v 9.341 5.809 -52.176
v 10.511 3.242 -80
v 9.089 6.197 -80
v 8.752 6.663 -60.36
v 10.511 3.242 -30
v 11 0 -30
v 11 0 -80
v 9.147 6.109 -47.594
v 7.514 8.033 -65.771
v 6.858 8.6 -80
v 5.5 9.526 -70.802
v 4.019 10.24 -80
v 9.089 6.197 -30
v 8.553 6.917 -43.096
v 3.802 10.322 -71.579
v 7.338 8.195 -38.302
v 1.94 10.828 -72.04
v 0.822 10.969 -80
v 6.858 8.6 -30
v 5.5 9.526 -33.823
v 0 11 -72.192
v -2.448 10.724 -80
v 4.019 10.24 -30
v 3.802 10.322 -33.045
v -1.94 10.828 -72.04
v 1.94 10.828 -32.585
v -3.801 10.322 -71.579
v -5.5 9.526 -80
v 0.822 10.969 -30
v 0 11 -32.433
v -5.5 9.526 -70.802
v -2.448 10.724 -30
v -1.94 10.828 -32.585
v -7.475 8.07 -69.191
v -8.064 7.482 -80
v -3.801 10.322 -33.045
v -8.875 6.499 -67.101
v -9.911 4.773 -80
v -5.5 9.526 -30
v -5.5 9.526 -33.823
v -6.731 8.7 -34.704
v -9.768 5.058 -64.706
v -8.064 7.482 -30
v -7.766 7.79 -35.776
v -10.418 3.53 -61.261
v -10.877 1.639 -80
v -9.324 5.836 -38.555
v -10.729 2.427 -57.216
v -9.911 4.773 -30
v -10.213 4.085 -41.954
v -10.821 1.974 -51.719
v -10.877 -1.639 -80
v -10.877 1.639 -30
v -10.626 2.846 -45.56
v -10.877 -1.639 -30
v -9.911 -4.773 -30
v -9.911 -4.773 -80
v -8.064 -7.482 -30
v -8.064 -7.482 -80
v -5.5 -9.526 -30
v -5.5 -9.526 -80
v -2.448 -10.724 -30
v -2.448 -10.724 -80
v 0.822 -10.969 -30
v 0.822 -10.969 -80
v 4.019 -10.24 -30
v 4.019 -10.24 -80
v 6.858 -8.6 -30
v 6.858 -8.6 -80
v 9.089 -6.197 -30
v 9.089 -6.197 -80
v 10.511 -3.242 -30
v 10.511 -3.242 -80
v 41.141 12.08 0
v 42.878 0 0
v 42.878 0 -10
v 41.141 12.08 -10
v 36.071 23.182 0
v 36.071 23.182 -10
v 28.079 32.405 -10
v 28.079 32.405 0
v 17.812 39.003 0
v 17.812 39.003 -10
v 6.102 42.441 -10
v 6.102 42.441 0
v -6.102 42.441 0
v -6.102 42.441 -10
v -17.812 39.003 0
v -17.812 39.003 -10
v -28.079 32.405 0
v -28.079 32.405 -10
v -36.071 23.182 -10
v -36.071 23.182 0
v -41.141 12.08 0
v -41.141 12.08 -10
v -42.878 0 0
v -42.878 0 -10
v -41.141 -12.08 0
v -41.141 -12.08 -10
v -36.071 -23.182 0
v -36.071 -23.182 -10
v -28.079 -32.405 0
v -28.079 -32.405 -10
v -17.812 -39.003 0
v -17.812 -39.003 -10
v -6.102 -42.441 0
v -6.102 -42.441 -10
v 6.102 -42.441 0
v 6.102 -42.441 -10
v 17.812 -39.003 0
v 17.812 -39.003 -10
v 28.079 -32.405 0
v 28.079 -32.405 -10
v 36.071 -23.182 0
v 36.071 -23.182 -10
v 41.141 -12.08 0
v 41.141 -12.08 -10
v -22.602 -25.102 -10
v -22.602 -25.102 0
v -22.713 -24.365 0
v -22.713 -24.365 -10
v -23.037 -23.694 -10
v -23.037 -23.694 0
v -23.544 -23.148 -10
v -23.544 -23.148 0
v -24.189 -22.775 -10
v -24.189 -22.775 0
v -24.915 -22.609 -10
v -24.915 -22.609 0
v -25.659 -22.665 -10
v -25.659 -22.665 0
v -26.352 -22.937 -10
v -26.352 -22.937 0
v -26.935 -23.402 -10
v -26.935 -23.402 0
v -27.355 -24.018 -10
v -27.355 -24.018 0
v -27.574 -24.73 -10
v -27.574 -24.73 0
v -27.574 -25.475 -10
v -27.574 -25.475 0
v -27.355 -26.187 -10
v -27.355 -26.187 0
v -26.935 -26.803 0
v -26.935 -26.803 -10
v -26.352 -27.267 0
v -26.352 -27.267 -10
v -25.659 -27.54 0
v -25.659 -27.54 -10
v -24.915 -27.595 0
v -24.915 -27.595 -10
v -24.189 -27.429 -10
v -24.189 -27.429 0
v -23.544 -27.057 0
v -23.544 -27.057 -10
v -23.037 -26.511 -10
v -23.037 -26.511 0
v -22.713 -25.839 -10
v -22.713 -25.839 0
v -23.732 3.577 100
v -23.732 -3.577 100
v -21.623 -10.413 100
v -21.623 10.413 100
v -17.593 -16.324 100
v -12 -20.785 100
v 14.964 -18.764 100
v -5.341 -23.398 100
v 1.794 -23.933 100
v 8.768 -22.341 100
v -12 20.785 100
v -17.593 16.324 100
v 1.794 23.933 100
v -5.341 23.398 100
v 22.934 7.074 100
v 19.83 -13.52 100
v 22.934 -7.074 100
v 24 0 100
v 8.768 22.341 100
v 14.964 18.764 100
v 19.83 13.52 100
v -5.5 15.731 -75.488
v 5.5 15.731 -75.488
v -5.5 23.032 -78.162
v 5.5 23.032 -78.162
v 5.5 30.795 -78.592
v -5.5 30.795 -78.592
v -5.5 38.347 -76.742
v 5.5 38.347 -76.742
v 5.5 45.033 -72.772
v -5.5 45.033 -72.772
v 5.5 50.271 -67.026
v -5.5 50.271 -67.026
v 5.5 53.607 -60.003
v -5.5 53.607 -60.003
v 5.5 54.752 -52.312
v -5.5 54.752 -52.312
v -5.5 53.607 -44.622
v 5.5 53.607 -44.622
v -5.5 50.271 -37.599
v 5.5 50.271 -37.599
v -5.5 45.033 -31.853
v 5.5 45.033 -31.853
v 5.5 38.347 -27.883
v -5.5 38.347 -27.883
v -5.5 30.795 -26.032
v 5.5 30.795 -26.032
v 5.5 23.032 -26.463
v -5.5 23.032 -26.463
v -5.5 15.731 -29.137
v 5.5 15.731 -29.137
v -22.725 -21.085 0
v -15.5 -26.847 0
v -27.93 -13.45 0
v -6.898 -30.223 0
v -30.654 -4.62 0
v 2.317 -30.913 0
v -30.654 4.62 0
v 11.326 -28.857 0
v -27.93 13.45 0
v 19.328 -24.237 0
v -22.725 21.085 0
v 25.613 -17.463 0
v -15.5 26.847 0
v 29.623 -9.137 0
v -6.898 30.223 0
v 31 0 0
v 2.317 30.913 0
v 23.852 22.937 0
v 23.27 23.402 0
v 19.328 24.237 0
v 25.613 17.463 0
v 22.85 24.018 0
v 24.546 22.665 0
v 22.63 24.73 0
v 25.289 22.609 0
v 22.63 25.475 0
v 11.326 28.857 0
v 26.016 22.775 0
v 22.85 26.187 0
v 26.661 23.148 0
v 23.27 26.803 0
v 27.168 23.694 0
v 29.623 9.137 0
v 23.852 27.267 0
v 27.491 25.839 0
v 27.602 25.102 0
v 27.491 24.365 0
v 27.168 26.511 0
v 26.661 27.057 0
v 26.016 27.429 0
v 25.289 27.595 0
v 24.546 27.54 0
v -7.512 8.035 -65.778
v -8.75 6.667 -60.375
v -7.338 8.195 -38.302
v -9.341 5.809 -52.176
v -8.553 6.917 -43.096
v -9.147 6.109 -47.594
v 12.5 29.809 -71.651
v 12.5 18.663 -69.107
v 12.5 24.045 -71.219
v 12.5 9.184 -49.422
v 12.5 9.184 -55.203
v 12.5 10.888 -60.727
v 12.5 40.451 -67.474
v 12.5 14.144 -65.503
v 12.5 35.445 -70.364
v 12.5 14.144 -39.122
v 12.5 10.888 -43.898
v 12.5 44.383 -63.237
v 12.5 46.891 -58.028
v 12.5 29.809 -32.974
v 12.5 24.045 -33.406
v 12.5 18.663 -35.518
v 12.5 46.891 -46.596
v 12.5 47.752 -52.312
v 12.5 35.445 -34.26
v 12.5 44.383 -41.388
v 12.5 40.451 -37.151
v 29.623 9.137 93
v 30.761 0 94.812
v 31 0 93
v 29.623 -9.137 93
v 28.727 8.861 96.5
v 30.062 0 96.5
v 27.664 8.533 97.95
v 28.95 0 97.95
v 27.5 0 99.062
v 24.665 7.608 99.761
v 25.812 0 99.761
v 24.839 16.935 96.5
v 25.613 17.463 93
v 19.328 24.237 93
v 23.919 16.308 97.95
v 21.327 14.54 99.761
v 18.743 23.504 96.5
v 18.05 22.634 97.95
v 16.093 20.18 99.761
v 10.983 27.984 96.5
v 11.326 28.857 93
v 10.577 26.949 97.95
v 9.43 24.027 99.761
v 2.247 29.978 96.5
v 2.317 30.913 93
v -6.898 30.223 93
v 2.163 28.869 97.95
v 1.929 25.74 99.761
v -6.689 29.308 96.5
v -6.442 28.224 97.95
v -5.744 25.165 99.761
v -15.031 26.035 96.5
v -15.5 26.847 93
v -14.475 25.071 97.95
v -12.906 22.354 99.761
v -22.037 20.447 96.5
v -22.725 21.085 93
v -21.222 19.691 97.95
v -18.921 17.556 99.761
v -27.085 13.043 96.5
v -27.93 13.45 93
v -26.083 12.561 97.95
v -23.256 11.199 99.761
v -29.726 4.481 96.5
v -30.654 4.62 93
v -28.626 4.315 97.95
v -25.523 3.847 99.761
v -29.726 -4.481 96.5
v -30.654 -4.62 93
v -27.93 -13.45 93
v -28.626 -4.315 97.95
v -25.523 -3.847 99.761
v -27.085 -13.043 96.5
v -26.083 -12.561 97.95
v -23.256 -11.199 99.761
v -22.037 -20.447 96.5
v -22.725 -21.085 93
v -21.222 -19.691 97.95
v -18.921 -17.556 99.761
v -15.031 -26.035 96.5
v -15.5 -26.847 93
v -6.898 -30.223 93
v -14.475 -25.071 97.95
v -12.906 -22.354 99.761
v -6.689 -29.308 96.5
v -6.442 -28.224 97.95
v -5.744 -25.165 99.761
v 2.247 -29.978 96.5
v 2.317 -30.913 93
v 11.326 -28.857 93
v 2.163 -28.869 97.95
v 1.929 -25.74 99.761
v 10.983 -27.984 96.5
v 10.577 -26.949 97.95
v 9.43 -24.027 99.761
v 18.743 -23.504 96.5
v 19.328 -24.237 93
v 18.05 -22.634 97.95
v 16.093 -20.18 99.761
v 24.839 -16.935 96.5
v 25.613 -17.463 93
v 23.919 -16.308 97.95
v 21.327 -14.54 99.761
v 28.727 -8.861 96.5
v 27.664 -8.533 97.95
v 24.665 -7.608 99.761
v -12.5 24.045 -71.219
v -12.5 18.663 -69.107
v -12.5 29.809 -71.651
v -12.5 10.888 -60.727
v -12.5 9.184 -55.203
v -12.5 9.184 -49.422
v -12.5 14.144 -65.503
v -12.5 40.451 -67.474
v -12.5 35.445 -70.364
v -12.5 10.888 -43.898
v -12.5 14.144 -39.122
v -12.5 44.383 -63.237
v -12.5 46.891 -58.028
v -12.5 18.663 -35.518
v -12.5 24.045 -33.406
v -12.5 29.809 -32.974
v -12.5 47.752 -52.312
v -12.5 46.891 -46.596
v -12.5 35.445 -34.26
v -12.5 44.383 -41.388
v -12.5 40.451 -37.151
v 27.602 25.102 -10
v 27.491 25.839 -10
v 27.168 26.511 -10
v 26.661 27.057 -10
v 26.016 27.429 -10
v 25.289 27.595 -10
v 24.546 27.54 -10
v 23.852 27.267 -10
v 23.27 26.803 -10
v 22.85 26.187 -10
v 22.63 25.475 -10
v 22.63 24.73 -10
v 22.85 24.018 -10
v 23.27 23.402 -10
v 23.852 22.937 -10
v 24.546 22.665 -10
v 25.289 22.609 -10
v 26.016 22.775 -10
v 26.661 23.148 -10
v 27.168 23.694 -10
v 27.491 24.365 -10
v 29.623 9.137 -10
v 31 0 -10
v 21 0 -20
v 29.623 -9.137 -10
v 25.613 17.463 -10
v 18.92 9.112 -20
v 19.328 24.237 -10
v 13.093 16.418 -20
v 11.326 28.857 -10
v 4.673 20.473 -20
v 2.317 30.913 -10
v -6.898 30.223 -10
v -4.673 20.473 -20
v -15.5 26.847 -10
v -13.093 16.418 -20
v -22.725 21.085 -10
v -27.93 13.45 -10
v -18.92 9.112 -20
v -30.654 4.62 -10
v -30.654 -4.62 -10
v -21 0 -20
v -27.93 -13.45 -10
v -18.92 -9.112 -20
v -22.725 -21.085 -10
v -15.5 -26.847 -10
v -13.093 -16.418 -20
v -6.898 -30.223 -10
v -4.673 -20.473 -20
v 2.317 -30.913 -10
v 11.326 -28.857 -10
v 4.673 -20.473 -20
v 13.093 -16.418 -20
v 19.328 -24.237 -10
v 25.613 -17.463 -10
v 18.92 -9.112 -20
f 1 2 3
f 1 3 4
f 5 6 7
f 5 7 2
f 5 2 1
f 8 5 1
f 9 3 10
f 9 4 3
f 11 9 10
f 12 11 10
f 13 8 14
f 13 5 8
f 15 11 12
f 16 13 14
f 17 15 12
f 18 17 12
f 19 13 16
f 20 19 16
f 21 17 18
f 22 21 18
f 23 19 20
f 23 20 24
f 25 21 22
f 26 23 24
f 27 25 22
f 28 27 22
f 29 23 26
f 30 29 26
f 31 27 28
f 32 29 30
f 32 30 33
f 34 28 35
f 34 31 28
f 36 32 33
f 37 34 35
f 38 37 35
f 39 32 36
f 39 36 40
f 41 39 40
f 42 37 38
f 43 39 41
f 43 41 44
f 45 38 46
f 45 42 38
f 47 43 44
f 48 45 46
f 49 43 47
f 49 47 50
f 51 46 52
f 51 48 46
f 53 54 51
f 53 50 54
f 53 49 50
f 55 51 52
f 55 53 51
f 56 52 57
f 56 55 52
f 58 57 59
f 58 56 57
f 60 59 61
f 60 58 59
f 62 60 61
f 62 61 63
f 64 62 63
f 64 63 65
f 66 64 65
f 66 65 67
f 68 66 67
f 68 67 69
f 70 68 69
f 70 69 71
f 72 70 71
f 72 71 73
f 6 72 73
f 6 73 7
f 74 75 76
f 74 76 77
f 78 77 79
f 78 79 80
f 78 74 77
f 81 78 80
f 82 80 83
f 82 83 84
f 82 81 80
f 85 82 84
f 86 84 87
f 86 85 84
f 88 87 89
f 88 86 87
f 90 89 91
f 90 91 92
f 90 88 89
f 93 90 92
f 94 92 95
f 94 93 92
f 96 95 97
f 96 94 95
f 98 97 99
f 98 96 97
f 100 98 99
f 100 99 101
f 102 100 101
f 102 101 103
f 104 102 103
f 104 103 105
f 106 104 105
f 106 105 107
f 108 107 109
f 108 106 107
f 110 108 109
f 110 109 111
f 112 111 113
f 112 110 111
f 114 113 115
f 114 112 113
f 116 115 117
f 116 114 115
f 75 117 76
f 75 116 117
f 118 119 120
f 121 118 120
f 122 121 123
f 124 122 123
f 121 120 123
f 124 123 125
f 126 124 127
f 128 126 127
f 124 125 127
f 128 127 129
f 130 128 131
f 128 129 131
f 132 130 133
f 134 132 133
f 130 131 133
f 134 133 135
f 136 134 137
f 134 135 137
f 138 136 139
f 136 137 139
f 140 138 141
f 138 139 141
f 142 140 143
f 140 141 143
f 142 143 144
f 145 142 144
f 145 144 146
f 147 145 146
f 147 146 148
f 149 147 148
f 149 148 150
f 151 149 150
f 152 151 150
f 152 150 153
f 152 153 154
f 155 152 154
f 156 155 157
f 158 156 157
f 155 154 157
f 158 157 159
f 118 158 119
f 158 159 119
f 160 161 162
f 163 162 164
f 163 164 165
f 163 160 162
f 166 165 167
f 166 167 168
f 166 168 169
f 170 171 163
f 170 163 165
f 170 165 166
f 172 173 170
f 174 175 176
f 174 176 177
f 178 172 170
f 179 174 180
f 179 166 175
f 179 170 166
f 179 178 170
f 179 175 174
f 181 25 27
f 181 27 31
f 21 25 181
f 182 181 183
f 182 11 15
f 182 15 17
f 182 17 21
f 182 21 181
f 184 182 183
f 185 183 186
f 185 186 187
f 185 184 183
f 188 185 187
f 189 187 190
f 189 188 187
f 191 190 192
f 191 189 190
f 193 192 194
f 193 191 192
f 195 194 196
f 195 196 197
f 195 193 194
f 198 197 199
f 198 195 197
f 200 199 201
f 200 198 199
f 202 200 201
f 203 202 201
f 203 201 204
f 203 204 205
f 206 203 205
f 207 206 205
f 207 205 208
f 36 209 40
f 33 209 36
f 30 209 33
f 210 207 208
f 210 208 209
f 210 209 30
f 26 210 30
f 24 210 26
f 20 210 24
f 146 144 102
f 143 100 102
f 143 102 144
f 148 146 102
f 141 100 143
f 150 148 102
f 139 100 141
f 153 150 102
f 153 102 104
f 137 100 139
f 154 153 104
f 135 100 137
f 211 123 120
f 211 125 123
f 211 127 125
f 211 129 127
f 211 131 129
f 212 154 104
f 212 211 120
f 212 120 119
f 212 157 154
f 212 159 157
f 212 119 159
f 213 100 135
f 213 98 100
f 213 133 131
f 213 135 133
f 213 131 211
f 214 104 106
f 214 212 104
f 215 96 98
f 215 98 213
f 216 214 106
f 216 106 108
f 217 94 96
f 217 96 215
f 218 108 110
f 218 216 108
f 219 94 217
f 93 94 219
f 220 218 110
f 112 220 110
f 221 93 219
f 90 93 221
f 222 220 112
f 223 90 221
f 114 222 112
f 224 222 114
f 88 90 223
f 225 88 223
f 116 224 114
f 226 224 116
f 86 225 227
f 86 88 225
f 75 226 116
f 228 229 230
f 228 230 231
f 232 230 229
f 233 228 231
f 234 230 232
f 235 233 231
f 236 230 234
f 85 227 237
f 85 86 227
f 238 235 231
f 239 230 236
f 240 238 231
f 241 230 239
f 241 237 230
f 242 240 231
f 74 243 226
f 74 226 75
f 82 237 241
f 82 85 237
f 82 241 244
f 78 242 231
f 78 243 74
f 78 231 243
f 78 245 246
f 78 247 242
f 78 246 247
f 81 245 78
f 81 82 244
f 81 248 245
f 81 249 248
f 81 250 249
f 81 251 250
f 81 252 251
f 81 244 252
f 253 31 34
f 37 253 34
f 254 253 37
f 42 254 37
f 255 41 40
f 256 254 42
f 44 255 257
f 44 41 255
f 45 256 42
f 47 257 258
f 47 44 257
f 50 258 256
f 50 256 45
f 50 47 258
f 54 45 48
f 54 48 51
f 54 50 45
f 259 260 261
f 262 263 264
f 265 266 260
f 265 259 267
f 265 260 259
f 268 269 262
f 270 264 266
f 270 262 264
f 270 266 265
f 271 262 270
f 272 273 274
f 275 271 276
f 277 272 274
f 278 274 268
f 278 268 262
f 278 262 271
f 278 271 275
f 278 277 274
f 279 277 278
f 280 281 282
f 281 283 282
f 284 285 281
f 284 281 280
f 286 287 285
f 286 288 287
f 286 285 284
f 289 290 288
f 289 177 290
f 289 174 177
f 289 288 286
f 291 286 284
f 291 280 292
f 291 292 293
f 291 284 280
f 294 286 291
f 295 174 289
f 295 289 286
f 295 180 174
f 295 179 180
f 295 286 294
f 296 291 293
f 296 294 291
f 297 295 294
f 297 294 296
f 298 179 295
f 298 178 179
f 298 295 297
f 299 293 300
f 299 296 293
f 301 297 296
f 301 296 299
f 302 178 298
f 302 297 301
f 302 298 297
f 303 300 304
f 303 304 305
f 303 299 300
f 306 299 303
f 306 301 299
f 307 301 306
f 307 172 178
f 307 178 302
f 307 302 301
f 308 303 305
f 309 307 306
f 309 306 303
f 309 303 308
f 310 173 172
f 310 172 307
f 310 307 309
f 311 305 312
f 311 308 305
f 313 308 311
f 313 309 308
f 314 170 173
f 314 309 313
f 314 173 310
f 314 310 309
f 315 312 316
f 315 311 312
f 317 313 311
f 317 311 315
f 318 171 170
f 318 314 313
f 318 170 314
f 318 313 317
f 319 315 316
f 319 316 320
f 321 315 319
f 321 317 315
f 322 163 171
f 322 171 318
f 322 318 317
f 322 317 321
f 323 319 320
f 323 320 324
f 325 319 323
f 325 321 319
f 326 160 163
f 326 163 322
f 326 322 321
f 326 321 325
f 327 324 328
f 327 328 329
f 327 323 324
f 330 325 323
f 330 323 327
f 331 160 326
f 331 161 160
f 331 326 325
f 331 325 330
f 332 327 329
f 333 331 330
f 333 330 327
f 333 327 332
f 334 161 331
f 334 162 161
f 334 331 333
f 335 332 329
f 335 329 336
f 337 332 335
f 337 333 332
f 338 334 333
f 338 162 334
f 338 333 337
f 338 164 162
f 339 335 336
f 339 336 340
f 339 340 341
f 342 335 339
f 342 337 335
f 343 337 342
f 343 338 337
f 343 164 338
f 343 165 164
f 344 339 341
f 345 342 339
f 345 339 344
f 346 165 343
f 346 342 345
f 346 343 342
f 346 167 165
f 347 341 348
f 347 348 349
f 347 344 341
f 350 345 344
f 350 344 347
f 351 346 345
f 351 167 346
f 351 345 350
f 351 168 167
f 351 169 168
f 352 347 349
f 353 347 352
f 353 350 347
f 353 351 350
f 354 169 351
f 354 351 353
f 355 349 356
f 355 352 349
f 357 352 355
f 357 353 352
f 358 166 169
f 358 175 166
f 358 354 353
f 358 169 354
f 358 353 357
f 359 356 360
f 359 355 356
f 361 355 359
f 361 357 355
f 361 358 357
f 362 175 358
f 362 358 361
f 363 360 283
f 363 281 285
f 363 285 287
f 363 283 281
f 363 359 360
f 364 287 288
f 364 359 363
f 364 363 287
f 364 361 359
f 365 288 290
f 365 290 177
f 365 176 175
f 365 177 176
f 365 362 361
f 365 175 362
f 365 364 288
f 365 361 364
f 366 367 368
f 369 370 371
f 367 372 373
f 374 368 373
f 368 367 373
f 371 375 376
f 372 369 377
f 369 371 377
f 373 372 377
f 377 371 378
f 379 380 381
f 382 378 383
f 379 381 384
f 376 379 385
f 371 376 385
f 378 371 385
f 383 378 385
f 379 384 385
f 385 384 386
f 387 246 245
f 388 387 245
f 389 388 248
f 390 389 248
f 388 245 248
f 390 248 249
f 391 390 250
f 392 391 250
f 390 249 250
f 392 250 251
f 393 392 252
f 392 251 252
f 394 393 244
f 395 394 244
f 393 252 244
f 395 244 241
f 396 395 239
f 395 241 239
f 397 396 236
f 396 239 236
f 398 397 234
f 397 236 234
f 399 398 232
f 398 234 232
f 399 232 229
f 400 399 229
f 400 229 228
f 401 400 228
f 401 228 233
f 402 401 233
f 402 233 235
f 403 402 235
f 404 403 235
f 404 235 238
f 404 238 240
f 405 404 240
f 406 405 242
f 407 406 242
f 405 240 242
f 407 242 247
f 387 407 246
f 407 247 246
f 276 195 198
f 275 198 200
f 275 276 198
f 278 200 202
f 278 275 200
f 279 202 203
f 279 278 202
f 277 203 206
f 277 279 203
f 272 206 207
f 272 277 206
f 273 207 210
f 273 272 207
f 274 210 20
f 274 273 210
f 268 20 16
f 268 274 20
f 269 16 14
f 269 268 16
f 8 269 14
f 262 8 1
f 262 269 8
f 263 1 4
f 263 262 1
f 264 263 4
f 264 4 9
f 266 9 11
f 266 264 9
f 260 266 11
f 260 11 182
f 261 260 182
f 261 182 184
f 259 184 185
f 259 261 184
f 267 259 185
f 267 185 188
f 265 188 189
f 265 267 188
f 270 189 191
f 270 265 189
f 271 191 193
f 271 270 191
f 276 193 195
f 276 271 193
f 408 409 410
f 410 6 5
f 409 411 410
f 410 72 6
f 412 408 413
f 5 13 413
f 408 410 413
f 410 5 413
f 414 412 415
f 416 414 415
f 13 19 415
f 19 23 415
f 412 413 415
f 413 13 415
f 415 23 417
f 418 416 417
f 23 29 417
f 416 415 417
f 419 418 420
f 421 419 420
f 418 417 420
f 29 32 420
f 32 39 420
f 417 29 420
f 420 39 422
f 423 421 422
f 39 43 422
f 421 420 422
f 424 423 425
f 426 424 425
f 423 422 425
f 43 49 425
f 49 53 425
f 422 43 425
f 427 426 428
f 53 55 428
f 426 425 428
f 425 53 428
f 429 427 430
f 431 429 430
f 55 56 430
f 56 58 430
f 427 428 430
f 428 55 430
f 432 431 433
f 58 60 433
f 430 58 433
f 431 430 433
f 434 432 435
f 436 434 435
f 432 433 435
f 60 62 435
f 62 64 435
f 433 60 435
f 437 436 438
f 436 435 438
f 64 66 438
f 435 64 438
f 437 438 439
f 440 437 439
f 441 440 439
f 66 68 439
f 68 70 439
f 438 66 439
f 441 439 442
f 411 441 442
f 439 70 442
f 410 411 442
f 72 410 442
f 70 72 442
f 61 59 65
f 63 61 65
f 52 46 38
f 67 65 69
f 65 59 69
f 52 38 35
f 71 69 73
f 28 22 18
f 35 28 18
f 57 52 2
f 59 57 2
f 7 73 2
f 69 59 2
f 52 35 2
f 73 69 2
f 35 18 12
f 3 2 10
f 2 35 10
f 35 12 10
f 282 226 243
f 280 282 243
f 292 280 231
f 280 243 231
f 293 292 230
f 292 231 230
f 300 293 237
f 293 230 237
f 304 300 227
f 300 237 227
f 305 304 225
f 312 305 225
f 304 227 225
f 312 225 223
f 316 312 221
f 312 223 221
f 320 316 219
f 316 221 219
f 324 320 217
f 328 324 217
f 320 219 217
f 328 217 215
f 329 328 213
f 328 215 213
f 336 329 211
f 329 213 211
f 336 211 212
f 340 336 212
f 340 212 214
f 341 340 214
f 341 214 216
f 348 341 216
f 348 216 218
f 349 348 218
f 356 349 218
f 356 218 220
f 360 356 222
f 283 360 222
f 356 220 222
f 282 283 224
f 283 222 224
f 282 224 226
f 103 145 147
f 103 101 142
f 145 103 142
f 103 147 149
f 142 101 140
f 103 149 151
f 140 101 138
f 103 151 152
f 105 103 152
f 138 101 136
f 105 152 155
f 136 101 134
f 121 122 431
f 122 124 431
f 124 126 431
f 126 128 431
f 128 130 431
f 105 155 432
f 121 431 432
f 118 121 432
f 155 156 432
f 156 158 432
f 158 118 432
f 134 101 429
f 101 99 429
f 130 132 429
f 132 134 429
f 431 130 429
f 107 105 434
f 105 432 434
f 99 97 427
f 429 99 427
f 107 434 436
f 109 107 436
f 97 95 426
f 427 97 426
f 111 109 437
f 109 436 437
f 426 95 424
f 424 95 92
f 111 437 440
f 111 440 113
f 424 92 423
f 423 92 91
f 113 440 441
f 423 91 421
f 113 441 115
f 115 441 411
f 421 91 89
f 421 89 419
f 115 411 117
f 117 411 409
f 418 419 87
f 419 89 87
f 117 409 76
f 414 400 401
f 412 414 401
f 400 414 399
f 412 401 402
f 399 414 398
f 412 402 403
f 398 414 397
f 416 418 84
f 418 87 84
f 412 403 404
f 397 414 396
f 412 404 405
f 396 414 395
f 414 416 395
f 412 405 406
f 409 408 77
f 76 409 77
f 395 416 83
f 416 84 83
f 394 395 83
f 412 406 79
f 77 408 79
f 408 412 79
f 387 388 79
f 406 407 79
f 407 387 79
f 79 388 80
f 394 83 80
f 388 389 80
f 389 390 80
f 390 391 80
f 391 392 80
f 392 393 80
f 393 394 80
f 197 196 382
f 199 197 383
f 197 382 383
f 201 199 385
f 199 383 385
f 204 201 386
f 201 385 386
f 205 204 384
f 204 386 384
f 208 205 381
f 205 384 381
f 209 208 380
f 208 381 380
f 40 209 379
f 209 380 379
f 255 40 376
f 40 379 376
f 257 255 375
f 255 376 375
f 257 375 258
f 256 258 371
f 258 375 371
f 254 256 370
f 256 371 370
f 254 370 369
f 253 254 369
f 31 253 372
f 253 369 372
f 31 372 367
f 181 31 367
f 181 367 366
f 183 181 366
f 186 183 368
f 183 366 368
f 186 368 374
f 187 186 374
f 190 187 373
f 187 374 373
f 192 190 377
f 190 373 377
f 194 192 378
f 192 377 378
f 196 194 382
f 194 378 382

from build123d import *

# Parameters (mm, degrees)
F0_R          = 31
F0_R_2        = 11.0794827648
F1_DEPTH      = 100
F2_R          = 7
F0_R_3        = 42.8779340108
F0_R_4        = 2.5
F3_DEPTH      = 10
F4_DEPTH      = 30
F5_DEPTH      = 30
F6_SIZE       = 19.99999
F7_DEPTH      = 50
F8_R          = 26.3926129655
F9_DEPTH      = 12.5
F10_S5_R      = 11.00001
F10_T6_DEPTH  = 39
F10_S11_R     = 11.00001
F10_T12_DEPTH = 39


# Not quite as in the source:
# - a fillet or chamfer that OpenCascade refuses, or shapes differently, is made with other operations: its cross-section is extruded or revolved along the edge and cut away or added
# - a fillet or chamfer is up to 0.001 mm smaller than in the source, because OpenCascade refuses the exact size


with BuildPart() as f1:
    # F0 (on Top) → F1 (new body)
    with BuildSketch(Plane.XY):
        Circle(F0_R)
        Circle(F0_R_2, mode=Mode.SUBTRACT)
        Circle(F0_R_2)
    extrude(amount=F1_DEPTH)

    # F2
    f2_edges = [f1.edges().sort_by_distance(p)[0] for p in [
        (-31, 0, 100),
    ]]
    fillet(f2_edges, radius=F2_R)

    # F0 (on Top) → F3 (join)
    with BuildSketch(Plane.XY):
        Circle(F0_R_3)
        with Locations((-25.1022907321, -25.1022907321)):
            Circle(F0_R_4, mode=Mode.SUBTRACT)
        Circle(F0_R, mode=Mode.SUBTRACT)
        with Locations((25.1022907321, 25.1022907321)):
            Circle(F0_R_4, mode=Mode.SUBTRACT)
    extrude(amount=-F3_DEPTH)

    # F0 (on Top) → F4 (join)
    with BuildSketch(Plane.XY):
        Circle(F0_R_2)
    extrude(amount=-F4_DEPTH)

    # F0 (on Top) → F5 (join)
    with BuildSketch(Plane.XY):
        Circle(F0_R)
        Circle(F0_R_2, mode=Mode.SUBTRACT)
    extrude(amount=-F5_DEPTH)

    # F6 (size 20 in the source; OpenCascade refuses exactly that, so slightly less here)
    f6_edges = [f1.edges().sort_by_distance(p)[0] for p in [
        (-31, 0, -30),
    ]]
    chamfer(f6_edges, length=F6_SIZE)

    # F7 (add): a face of the model
    f7_faces = [f1.faces().sort_by_distance(p)[0] for p in [
        (0, 0, -30),
    ]]
    extrude(f7_faces, amount=F7_DEPTH)

    # F8 (on Right) → F9 (join, symmetric)
    with BuildSketch(Plane.YZ):
        with Locations((28.3597782254, -52.3124225438)):
            Circle(F8_R)
    extrude(amount=F9_DEPTH, both=True)

    # F10: chamfer of 7 on 2 edges, made by hand


with BuildPart() as f10_tool2:
    # F10_s3 → F10_t4 (revolve)
    with BuildSketch(Plane.XY.offset(-52.3124225438)):
        Polygon((5.5, 54.7523911909), (12.5, 47.7523911909), (12.5, 54.7523911909), align=None)
    revolve(axis=Axis((12.5, 28.3597782254, -52.3124225438), (1, 0, 0)))

    # F10_s5 → F10_t6 (cut, symmetric)
    with BuildSketch(Plane.XY.offset(-52.3)):
        Circle(F10_S5_R)
    extrude(amount=F10_T6_DEPTH, both=True, mode=Mode.SUBTRACT)


with BuildPart() as f1_1:
    add(f1.part)

    # F10_t1: cut F10_tool2
    add(f10_tool2.part, mode=Mode.SUBTRACT)


with BuildPart() as f10_tool8:
    # F10_s9 → F10_t10 (revolve)
    with BuildSketch(Plane.XY.offset(-52.3124225438)):
        Polygon((-5.5, 54.7523911909), (-12.5, 47.7523911909), (-12.5, 54.7523911909), align=None)
    revolve(axis=Axis((-12.5, 28.3597782254, -52.3124225438), (1, 0, 0)))

    # F10_s11 → F10_t12 (cut, symmetric)
    with BuildSketch(Plane.XY.offset(-52.3)):
        Circle(F10_S11_R)
    extrude(amount=F10_T12_DEPTH, both=True, mode=Mode.SUBTRACT)


with BuildPart() as f1_2:
    add(f1_1.part)

    # F10_t7: cut F10_tool8
    add(f10_tool8.part, mode=Mode.SUBTRACT)


solid = f1_2.part
